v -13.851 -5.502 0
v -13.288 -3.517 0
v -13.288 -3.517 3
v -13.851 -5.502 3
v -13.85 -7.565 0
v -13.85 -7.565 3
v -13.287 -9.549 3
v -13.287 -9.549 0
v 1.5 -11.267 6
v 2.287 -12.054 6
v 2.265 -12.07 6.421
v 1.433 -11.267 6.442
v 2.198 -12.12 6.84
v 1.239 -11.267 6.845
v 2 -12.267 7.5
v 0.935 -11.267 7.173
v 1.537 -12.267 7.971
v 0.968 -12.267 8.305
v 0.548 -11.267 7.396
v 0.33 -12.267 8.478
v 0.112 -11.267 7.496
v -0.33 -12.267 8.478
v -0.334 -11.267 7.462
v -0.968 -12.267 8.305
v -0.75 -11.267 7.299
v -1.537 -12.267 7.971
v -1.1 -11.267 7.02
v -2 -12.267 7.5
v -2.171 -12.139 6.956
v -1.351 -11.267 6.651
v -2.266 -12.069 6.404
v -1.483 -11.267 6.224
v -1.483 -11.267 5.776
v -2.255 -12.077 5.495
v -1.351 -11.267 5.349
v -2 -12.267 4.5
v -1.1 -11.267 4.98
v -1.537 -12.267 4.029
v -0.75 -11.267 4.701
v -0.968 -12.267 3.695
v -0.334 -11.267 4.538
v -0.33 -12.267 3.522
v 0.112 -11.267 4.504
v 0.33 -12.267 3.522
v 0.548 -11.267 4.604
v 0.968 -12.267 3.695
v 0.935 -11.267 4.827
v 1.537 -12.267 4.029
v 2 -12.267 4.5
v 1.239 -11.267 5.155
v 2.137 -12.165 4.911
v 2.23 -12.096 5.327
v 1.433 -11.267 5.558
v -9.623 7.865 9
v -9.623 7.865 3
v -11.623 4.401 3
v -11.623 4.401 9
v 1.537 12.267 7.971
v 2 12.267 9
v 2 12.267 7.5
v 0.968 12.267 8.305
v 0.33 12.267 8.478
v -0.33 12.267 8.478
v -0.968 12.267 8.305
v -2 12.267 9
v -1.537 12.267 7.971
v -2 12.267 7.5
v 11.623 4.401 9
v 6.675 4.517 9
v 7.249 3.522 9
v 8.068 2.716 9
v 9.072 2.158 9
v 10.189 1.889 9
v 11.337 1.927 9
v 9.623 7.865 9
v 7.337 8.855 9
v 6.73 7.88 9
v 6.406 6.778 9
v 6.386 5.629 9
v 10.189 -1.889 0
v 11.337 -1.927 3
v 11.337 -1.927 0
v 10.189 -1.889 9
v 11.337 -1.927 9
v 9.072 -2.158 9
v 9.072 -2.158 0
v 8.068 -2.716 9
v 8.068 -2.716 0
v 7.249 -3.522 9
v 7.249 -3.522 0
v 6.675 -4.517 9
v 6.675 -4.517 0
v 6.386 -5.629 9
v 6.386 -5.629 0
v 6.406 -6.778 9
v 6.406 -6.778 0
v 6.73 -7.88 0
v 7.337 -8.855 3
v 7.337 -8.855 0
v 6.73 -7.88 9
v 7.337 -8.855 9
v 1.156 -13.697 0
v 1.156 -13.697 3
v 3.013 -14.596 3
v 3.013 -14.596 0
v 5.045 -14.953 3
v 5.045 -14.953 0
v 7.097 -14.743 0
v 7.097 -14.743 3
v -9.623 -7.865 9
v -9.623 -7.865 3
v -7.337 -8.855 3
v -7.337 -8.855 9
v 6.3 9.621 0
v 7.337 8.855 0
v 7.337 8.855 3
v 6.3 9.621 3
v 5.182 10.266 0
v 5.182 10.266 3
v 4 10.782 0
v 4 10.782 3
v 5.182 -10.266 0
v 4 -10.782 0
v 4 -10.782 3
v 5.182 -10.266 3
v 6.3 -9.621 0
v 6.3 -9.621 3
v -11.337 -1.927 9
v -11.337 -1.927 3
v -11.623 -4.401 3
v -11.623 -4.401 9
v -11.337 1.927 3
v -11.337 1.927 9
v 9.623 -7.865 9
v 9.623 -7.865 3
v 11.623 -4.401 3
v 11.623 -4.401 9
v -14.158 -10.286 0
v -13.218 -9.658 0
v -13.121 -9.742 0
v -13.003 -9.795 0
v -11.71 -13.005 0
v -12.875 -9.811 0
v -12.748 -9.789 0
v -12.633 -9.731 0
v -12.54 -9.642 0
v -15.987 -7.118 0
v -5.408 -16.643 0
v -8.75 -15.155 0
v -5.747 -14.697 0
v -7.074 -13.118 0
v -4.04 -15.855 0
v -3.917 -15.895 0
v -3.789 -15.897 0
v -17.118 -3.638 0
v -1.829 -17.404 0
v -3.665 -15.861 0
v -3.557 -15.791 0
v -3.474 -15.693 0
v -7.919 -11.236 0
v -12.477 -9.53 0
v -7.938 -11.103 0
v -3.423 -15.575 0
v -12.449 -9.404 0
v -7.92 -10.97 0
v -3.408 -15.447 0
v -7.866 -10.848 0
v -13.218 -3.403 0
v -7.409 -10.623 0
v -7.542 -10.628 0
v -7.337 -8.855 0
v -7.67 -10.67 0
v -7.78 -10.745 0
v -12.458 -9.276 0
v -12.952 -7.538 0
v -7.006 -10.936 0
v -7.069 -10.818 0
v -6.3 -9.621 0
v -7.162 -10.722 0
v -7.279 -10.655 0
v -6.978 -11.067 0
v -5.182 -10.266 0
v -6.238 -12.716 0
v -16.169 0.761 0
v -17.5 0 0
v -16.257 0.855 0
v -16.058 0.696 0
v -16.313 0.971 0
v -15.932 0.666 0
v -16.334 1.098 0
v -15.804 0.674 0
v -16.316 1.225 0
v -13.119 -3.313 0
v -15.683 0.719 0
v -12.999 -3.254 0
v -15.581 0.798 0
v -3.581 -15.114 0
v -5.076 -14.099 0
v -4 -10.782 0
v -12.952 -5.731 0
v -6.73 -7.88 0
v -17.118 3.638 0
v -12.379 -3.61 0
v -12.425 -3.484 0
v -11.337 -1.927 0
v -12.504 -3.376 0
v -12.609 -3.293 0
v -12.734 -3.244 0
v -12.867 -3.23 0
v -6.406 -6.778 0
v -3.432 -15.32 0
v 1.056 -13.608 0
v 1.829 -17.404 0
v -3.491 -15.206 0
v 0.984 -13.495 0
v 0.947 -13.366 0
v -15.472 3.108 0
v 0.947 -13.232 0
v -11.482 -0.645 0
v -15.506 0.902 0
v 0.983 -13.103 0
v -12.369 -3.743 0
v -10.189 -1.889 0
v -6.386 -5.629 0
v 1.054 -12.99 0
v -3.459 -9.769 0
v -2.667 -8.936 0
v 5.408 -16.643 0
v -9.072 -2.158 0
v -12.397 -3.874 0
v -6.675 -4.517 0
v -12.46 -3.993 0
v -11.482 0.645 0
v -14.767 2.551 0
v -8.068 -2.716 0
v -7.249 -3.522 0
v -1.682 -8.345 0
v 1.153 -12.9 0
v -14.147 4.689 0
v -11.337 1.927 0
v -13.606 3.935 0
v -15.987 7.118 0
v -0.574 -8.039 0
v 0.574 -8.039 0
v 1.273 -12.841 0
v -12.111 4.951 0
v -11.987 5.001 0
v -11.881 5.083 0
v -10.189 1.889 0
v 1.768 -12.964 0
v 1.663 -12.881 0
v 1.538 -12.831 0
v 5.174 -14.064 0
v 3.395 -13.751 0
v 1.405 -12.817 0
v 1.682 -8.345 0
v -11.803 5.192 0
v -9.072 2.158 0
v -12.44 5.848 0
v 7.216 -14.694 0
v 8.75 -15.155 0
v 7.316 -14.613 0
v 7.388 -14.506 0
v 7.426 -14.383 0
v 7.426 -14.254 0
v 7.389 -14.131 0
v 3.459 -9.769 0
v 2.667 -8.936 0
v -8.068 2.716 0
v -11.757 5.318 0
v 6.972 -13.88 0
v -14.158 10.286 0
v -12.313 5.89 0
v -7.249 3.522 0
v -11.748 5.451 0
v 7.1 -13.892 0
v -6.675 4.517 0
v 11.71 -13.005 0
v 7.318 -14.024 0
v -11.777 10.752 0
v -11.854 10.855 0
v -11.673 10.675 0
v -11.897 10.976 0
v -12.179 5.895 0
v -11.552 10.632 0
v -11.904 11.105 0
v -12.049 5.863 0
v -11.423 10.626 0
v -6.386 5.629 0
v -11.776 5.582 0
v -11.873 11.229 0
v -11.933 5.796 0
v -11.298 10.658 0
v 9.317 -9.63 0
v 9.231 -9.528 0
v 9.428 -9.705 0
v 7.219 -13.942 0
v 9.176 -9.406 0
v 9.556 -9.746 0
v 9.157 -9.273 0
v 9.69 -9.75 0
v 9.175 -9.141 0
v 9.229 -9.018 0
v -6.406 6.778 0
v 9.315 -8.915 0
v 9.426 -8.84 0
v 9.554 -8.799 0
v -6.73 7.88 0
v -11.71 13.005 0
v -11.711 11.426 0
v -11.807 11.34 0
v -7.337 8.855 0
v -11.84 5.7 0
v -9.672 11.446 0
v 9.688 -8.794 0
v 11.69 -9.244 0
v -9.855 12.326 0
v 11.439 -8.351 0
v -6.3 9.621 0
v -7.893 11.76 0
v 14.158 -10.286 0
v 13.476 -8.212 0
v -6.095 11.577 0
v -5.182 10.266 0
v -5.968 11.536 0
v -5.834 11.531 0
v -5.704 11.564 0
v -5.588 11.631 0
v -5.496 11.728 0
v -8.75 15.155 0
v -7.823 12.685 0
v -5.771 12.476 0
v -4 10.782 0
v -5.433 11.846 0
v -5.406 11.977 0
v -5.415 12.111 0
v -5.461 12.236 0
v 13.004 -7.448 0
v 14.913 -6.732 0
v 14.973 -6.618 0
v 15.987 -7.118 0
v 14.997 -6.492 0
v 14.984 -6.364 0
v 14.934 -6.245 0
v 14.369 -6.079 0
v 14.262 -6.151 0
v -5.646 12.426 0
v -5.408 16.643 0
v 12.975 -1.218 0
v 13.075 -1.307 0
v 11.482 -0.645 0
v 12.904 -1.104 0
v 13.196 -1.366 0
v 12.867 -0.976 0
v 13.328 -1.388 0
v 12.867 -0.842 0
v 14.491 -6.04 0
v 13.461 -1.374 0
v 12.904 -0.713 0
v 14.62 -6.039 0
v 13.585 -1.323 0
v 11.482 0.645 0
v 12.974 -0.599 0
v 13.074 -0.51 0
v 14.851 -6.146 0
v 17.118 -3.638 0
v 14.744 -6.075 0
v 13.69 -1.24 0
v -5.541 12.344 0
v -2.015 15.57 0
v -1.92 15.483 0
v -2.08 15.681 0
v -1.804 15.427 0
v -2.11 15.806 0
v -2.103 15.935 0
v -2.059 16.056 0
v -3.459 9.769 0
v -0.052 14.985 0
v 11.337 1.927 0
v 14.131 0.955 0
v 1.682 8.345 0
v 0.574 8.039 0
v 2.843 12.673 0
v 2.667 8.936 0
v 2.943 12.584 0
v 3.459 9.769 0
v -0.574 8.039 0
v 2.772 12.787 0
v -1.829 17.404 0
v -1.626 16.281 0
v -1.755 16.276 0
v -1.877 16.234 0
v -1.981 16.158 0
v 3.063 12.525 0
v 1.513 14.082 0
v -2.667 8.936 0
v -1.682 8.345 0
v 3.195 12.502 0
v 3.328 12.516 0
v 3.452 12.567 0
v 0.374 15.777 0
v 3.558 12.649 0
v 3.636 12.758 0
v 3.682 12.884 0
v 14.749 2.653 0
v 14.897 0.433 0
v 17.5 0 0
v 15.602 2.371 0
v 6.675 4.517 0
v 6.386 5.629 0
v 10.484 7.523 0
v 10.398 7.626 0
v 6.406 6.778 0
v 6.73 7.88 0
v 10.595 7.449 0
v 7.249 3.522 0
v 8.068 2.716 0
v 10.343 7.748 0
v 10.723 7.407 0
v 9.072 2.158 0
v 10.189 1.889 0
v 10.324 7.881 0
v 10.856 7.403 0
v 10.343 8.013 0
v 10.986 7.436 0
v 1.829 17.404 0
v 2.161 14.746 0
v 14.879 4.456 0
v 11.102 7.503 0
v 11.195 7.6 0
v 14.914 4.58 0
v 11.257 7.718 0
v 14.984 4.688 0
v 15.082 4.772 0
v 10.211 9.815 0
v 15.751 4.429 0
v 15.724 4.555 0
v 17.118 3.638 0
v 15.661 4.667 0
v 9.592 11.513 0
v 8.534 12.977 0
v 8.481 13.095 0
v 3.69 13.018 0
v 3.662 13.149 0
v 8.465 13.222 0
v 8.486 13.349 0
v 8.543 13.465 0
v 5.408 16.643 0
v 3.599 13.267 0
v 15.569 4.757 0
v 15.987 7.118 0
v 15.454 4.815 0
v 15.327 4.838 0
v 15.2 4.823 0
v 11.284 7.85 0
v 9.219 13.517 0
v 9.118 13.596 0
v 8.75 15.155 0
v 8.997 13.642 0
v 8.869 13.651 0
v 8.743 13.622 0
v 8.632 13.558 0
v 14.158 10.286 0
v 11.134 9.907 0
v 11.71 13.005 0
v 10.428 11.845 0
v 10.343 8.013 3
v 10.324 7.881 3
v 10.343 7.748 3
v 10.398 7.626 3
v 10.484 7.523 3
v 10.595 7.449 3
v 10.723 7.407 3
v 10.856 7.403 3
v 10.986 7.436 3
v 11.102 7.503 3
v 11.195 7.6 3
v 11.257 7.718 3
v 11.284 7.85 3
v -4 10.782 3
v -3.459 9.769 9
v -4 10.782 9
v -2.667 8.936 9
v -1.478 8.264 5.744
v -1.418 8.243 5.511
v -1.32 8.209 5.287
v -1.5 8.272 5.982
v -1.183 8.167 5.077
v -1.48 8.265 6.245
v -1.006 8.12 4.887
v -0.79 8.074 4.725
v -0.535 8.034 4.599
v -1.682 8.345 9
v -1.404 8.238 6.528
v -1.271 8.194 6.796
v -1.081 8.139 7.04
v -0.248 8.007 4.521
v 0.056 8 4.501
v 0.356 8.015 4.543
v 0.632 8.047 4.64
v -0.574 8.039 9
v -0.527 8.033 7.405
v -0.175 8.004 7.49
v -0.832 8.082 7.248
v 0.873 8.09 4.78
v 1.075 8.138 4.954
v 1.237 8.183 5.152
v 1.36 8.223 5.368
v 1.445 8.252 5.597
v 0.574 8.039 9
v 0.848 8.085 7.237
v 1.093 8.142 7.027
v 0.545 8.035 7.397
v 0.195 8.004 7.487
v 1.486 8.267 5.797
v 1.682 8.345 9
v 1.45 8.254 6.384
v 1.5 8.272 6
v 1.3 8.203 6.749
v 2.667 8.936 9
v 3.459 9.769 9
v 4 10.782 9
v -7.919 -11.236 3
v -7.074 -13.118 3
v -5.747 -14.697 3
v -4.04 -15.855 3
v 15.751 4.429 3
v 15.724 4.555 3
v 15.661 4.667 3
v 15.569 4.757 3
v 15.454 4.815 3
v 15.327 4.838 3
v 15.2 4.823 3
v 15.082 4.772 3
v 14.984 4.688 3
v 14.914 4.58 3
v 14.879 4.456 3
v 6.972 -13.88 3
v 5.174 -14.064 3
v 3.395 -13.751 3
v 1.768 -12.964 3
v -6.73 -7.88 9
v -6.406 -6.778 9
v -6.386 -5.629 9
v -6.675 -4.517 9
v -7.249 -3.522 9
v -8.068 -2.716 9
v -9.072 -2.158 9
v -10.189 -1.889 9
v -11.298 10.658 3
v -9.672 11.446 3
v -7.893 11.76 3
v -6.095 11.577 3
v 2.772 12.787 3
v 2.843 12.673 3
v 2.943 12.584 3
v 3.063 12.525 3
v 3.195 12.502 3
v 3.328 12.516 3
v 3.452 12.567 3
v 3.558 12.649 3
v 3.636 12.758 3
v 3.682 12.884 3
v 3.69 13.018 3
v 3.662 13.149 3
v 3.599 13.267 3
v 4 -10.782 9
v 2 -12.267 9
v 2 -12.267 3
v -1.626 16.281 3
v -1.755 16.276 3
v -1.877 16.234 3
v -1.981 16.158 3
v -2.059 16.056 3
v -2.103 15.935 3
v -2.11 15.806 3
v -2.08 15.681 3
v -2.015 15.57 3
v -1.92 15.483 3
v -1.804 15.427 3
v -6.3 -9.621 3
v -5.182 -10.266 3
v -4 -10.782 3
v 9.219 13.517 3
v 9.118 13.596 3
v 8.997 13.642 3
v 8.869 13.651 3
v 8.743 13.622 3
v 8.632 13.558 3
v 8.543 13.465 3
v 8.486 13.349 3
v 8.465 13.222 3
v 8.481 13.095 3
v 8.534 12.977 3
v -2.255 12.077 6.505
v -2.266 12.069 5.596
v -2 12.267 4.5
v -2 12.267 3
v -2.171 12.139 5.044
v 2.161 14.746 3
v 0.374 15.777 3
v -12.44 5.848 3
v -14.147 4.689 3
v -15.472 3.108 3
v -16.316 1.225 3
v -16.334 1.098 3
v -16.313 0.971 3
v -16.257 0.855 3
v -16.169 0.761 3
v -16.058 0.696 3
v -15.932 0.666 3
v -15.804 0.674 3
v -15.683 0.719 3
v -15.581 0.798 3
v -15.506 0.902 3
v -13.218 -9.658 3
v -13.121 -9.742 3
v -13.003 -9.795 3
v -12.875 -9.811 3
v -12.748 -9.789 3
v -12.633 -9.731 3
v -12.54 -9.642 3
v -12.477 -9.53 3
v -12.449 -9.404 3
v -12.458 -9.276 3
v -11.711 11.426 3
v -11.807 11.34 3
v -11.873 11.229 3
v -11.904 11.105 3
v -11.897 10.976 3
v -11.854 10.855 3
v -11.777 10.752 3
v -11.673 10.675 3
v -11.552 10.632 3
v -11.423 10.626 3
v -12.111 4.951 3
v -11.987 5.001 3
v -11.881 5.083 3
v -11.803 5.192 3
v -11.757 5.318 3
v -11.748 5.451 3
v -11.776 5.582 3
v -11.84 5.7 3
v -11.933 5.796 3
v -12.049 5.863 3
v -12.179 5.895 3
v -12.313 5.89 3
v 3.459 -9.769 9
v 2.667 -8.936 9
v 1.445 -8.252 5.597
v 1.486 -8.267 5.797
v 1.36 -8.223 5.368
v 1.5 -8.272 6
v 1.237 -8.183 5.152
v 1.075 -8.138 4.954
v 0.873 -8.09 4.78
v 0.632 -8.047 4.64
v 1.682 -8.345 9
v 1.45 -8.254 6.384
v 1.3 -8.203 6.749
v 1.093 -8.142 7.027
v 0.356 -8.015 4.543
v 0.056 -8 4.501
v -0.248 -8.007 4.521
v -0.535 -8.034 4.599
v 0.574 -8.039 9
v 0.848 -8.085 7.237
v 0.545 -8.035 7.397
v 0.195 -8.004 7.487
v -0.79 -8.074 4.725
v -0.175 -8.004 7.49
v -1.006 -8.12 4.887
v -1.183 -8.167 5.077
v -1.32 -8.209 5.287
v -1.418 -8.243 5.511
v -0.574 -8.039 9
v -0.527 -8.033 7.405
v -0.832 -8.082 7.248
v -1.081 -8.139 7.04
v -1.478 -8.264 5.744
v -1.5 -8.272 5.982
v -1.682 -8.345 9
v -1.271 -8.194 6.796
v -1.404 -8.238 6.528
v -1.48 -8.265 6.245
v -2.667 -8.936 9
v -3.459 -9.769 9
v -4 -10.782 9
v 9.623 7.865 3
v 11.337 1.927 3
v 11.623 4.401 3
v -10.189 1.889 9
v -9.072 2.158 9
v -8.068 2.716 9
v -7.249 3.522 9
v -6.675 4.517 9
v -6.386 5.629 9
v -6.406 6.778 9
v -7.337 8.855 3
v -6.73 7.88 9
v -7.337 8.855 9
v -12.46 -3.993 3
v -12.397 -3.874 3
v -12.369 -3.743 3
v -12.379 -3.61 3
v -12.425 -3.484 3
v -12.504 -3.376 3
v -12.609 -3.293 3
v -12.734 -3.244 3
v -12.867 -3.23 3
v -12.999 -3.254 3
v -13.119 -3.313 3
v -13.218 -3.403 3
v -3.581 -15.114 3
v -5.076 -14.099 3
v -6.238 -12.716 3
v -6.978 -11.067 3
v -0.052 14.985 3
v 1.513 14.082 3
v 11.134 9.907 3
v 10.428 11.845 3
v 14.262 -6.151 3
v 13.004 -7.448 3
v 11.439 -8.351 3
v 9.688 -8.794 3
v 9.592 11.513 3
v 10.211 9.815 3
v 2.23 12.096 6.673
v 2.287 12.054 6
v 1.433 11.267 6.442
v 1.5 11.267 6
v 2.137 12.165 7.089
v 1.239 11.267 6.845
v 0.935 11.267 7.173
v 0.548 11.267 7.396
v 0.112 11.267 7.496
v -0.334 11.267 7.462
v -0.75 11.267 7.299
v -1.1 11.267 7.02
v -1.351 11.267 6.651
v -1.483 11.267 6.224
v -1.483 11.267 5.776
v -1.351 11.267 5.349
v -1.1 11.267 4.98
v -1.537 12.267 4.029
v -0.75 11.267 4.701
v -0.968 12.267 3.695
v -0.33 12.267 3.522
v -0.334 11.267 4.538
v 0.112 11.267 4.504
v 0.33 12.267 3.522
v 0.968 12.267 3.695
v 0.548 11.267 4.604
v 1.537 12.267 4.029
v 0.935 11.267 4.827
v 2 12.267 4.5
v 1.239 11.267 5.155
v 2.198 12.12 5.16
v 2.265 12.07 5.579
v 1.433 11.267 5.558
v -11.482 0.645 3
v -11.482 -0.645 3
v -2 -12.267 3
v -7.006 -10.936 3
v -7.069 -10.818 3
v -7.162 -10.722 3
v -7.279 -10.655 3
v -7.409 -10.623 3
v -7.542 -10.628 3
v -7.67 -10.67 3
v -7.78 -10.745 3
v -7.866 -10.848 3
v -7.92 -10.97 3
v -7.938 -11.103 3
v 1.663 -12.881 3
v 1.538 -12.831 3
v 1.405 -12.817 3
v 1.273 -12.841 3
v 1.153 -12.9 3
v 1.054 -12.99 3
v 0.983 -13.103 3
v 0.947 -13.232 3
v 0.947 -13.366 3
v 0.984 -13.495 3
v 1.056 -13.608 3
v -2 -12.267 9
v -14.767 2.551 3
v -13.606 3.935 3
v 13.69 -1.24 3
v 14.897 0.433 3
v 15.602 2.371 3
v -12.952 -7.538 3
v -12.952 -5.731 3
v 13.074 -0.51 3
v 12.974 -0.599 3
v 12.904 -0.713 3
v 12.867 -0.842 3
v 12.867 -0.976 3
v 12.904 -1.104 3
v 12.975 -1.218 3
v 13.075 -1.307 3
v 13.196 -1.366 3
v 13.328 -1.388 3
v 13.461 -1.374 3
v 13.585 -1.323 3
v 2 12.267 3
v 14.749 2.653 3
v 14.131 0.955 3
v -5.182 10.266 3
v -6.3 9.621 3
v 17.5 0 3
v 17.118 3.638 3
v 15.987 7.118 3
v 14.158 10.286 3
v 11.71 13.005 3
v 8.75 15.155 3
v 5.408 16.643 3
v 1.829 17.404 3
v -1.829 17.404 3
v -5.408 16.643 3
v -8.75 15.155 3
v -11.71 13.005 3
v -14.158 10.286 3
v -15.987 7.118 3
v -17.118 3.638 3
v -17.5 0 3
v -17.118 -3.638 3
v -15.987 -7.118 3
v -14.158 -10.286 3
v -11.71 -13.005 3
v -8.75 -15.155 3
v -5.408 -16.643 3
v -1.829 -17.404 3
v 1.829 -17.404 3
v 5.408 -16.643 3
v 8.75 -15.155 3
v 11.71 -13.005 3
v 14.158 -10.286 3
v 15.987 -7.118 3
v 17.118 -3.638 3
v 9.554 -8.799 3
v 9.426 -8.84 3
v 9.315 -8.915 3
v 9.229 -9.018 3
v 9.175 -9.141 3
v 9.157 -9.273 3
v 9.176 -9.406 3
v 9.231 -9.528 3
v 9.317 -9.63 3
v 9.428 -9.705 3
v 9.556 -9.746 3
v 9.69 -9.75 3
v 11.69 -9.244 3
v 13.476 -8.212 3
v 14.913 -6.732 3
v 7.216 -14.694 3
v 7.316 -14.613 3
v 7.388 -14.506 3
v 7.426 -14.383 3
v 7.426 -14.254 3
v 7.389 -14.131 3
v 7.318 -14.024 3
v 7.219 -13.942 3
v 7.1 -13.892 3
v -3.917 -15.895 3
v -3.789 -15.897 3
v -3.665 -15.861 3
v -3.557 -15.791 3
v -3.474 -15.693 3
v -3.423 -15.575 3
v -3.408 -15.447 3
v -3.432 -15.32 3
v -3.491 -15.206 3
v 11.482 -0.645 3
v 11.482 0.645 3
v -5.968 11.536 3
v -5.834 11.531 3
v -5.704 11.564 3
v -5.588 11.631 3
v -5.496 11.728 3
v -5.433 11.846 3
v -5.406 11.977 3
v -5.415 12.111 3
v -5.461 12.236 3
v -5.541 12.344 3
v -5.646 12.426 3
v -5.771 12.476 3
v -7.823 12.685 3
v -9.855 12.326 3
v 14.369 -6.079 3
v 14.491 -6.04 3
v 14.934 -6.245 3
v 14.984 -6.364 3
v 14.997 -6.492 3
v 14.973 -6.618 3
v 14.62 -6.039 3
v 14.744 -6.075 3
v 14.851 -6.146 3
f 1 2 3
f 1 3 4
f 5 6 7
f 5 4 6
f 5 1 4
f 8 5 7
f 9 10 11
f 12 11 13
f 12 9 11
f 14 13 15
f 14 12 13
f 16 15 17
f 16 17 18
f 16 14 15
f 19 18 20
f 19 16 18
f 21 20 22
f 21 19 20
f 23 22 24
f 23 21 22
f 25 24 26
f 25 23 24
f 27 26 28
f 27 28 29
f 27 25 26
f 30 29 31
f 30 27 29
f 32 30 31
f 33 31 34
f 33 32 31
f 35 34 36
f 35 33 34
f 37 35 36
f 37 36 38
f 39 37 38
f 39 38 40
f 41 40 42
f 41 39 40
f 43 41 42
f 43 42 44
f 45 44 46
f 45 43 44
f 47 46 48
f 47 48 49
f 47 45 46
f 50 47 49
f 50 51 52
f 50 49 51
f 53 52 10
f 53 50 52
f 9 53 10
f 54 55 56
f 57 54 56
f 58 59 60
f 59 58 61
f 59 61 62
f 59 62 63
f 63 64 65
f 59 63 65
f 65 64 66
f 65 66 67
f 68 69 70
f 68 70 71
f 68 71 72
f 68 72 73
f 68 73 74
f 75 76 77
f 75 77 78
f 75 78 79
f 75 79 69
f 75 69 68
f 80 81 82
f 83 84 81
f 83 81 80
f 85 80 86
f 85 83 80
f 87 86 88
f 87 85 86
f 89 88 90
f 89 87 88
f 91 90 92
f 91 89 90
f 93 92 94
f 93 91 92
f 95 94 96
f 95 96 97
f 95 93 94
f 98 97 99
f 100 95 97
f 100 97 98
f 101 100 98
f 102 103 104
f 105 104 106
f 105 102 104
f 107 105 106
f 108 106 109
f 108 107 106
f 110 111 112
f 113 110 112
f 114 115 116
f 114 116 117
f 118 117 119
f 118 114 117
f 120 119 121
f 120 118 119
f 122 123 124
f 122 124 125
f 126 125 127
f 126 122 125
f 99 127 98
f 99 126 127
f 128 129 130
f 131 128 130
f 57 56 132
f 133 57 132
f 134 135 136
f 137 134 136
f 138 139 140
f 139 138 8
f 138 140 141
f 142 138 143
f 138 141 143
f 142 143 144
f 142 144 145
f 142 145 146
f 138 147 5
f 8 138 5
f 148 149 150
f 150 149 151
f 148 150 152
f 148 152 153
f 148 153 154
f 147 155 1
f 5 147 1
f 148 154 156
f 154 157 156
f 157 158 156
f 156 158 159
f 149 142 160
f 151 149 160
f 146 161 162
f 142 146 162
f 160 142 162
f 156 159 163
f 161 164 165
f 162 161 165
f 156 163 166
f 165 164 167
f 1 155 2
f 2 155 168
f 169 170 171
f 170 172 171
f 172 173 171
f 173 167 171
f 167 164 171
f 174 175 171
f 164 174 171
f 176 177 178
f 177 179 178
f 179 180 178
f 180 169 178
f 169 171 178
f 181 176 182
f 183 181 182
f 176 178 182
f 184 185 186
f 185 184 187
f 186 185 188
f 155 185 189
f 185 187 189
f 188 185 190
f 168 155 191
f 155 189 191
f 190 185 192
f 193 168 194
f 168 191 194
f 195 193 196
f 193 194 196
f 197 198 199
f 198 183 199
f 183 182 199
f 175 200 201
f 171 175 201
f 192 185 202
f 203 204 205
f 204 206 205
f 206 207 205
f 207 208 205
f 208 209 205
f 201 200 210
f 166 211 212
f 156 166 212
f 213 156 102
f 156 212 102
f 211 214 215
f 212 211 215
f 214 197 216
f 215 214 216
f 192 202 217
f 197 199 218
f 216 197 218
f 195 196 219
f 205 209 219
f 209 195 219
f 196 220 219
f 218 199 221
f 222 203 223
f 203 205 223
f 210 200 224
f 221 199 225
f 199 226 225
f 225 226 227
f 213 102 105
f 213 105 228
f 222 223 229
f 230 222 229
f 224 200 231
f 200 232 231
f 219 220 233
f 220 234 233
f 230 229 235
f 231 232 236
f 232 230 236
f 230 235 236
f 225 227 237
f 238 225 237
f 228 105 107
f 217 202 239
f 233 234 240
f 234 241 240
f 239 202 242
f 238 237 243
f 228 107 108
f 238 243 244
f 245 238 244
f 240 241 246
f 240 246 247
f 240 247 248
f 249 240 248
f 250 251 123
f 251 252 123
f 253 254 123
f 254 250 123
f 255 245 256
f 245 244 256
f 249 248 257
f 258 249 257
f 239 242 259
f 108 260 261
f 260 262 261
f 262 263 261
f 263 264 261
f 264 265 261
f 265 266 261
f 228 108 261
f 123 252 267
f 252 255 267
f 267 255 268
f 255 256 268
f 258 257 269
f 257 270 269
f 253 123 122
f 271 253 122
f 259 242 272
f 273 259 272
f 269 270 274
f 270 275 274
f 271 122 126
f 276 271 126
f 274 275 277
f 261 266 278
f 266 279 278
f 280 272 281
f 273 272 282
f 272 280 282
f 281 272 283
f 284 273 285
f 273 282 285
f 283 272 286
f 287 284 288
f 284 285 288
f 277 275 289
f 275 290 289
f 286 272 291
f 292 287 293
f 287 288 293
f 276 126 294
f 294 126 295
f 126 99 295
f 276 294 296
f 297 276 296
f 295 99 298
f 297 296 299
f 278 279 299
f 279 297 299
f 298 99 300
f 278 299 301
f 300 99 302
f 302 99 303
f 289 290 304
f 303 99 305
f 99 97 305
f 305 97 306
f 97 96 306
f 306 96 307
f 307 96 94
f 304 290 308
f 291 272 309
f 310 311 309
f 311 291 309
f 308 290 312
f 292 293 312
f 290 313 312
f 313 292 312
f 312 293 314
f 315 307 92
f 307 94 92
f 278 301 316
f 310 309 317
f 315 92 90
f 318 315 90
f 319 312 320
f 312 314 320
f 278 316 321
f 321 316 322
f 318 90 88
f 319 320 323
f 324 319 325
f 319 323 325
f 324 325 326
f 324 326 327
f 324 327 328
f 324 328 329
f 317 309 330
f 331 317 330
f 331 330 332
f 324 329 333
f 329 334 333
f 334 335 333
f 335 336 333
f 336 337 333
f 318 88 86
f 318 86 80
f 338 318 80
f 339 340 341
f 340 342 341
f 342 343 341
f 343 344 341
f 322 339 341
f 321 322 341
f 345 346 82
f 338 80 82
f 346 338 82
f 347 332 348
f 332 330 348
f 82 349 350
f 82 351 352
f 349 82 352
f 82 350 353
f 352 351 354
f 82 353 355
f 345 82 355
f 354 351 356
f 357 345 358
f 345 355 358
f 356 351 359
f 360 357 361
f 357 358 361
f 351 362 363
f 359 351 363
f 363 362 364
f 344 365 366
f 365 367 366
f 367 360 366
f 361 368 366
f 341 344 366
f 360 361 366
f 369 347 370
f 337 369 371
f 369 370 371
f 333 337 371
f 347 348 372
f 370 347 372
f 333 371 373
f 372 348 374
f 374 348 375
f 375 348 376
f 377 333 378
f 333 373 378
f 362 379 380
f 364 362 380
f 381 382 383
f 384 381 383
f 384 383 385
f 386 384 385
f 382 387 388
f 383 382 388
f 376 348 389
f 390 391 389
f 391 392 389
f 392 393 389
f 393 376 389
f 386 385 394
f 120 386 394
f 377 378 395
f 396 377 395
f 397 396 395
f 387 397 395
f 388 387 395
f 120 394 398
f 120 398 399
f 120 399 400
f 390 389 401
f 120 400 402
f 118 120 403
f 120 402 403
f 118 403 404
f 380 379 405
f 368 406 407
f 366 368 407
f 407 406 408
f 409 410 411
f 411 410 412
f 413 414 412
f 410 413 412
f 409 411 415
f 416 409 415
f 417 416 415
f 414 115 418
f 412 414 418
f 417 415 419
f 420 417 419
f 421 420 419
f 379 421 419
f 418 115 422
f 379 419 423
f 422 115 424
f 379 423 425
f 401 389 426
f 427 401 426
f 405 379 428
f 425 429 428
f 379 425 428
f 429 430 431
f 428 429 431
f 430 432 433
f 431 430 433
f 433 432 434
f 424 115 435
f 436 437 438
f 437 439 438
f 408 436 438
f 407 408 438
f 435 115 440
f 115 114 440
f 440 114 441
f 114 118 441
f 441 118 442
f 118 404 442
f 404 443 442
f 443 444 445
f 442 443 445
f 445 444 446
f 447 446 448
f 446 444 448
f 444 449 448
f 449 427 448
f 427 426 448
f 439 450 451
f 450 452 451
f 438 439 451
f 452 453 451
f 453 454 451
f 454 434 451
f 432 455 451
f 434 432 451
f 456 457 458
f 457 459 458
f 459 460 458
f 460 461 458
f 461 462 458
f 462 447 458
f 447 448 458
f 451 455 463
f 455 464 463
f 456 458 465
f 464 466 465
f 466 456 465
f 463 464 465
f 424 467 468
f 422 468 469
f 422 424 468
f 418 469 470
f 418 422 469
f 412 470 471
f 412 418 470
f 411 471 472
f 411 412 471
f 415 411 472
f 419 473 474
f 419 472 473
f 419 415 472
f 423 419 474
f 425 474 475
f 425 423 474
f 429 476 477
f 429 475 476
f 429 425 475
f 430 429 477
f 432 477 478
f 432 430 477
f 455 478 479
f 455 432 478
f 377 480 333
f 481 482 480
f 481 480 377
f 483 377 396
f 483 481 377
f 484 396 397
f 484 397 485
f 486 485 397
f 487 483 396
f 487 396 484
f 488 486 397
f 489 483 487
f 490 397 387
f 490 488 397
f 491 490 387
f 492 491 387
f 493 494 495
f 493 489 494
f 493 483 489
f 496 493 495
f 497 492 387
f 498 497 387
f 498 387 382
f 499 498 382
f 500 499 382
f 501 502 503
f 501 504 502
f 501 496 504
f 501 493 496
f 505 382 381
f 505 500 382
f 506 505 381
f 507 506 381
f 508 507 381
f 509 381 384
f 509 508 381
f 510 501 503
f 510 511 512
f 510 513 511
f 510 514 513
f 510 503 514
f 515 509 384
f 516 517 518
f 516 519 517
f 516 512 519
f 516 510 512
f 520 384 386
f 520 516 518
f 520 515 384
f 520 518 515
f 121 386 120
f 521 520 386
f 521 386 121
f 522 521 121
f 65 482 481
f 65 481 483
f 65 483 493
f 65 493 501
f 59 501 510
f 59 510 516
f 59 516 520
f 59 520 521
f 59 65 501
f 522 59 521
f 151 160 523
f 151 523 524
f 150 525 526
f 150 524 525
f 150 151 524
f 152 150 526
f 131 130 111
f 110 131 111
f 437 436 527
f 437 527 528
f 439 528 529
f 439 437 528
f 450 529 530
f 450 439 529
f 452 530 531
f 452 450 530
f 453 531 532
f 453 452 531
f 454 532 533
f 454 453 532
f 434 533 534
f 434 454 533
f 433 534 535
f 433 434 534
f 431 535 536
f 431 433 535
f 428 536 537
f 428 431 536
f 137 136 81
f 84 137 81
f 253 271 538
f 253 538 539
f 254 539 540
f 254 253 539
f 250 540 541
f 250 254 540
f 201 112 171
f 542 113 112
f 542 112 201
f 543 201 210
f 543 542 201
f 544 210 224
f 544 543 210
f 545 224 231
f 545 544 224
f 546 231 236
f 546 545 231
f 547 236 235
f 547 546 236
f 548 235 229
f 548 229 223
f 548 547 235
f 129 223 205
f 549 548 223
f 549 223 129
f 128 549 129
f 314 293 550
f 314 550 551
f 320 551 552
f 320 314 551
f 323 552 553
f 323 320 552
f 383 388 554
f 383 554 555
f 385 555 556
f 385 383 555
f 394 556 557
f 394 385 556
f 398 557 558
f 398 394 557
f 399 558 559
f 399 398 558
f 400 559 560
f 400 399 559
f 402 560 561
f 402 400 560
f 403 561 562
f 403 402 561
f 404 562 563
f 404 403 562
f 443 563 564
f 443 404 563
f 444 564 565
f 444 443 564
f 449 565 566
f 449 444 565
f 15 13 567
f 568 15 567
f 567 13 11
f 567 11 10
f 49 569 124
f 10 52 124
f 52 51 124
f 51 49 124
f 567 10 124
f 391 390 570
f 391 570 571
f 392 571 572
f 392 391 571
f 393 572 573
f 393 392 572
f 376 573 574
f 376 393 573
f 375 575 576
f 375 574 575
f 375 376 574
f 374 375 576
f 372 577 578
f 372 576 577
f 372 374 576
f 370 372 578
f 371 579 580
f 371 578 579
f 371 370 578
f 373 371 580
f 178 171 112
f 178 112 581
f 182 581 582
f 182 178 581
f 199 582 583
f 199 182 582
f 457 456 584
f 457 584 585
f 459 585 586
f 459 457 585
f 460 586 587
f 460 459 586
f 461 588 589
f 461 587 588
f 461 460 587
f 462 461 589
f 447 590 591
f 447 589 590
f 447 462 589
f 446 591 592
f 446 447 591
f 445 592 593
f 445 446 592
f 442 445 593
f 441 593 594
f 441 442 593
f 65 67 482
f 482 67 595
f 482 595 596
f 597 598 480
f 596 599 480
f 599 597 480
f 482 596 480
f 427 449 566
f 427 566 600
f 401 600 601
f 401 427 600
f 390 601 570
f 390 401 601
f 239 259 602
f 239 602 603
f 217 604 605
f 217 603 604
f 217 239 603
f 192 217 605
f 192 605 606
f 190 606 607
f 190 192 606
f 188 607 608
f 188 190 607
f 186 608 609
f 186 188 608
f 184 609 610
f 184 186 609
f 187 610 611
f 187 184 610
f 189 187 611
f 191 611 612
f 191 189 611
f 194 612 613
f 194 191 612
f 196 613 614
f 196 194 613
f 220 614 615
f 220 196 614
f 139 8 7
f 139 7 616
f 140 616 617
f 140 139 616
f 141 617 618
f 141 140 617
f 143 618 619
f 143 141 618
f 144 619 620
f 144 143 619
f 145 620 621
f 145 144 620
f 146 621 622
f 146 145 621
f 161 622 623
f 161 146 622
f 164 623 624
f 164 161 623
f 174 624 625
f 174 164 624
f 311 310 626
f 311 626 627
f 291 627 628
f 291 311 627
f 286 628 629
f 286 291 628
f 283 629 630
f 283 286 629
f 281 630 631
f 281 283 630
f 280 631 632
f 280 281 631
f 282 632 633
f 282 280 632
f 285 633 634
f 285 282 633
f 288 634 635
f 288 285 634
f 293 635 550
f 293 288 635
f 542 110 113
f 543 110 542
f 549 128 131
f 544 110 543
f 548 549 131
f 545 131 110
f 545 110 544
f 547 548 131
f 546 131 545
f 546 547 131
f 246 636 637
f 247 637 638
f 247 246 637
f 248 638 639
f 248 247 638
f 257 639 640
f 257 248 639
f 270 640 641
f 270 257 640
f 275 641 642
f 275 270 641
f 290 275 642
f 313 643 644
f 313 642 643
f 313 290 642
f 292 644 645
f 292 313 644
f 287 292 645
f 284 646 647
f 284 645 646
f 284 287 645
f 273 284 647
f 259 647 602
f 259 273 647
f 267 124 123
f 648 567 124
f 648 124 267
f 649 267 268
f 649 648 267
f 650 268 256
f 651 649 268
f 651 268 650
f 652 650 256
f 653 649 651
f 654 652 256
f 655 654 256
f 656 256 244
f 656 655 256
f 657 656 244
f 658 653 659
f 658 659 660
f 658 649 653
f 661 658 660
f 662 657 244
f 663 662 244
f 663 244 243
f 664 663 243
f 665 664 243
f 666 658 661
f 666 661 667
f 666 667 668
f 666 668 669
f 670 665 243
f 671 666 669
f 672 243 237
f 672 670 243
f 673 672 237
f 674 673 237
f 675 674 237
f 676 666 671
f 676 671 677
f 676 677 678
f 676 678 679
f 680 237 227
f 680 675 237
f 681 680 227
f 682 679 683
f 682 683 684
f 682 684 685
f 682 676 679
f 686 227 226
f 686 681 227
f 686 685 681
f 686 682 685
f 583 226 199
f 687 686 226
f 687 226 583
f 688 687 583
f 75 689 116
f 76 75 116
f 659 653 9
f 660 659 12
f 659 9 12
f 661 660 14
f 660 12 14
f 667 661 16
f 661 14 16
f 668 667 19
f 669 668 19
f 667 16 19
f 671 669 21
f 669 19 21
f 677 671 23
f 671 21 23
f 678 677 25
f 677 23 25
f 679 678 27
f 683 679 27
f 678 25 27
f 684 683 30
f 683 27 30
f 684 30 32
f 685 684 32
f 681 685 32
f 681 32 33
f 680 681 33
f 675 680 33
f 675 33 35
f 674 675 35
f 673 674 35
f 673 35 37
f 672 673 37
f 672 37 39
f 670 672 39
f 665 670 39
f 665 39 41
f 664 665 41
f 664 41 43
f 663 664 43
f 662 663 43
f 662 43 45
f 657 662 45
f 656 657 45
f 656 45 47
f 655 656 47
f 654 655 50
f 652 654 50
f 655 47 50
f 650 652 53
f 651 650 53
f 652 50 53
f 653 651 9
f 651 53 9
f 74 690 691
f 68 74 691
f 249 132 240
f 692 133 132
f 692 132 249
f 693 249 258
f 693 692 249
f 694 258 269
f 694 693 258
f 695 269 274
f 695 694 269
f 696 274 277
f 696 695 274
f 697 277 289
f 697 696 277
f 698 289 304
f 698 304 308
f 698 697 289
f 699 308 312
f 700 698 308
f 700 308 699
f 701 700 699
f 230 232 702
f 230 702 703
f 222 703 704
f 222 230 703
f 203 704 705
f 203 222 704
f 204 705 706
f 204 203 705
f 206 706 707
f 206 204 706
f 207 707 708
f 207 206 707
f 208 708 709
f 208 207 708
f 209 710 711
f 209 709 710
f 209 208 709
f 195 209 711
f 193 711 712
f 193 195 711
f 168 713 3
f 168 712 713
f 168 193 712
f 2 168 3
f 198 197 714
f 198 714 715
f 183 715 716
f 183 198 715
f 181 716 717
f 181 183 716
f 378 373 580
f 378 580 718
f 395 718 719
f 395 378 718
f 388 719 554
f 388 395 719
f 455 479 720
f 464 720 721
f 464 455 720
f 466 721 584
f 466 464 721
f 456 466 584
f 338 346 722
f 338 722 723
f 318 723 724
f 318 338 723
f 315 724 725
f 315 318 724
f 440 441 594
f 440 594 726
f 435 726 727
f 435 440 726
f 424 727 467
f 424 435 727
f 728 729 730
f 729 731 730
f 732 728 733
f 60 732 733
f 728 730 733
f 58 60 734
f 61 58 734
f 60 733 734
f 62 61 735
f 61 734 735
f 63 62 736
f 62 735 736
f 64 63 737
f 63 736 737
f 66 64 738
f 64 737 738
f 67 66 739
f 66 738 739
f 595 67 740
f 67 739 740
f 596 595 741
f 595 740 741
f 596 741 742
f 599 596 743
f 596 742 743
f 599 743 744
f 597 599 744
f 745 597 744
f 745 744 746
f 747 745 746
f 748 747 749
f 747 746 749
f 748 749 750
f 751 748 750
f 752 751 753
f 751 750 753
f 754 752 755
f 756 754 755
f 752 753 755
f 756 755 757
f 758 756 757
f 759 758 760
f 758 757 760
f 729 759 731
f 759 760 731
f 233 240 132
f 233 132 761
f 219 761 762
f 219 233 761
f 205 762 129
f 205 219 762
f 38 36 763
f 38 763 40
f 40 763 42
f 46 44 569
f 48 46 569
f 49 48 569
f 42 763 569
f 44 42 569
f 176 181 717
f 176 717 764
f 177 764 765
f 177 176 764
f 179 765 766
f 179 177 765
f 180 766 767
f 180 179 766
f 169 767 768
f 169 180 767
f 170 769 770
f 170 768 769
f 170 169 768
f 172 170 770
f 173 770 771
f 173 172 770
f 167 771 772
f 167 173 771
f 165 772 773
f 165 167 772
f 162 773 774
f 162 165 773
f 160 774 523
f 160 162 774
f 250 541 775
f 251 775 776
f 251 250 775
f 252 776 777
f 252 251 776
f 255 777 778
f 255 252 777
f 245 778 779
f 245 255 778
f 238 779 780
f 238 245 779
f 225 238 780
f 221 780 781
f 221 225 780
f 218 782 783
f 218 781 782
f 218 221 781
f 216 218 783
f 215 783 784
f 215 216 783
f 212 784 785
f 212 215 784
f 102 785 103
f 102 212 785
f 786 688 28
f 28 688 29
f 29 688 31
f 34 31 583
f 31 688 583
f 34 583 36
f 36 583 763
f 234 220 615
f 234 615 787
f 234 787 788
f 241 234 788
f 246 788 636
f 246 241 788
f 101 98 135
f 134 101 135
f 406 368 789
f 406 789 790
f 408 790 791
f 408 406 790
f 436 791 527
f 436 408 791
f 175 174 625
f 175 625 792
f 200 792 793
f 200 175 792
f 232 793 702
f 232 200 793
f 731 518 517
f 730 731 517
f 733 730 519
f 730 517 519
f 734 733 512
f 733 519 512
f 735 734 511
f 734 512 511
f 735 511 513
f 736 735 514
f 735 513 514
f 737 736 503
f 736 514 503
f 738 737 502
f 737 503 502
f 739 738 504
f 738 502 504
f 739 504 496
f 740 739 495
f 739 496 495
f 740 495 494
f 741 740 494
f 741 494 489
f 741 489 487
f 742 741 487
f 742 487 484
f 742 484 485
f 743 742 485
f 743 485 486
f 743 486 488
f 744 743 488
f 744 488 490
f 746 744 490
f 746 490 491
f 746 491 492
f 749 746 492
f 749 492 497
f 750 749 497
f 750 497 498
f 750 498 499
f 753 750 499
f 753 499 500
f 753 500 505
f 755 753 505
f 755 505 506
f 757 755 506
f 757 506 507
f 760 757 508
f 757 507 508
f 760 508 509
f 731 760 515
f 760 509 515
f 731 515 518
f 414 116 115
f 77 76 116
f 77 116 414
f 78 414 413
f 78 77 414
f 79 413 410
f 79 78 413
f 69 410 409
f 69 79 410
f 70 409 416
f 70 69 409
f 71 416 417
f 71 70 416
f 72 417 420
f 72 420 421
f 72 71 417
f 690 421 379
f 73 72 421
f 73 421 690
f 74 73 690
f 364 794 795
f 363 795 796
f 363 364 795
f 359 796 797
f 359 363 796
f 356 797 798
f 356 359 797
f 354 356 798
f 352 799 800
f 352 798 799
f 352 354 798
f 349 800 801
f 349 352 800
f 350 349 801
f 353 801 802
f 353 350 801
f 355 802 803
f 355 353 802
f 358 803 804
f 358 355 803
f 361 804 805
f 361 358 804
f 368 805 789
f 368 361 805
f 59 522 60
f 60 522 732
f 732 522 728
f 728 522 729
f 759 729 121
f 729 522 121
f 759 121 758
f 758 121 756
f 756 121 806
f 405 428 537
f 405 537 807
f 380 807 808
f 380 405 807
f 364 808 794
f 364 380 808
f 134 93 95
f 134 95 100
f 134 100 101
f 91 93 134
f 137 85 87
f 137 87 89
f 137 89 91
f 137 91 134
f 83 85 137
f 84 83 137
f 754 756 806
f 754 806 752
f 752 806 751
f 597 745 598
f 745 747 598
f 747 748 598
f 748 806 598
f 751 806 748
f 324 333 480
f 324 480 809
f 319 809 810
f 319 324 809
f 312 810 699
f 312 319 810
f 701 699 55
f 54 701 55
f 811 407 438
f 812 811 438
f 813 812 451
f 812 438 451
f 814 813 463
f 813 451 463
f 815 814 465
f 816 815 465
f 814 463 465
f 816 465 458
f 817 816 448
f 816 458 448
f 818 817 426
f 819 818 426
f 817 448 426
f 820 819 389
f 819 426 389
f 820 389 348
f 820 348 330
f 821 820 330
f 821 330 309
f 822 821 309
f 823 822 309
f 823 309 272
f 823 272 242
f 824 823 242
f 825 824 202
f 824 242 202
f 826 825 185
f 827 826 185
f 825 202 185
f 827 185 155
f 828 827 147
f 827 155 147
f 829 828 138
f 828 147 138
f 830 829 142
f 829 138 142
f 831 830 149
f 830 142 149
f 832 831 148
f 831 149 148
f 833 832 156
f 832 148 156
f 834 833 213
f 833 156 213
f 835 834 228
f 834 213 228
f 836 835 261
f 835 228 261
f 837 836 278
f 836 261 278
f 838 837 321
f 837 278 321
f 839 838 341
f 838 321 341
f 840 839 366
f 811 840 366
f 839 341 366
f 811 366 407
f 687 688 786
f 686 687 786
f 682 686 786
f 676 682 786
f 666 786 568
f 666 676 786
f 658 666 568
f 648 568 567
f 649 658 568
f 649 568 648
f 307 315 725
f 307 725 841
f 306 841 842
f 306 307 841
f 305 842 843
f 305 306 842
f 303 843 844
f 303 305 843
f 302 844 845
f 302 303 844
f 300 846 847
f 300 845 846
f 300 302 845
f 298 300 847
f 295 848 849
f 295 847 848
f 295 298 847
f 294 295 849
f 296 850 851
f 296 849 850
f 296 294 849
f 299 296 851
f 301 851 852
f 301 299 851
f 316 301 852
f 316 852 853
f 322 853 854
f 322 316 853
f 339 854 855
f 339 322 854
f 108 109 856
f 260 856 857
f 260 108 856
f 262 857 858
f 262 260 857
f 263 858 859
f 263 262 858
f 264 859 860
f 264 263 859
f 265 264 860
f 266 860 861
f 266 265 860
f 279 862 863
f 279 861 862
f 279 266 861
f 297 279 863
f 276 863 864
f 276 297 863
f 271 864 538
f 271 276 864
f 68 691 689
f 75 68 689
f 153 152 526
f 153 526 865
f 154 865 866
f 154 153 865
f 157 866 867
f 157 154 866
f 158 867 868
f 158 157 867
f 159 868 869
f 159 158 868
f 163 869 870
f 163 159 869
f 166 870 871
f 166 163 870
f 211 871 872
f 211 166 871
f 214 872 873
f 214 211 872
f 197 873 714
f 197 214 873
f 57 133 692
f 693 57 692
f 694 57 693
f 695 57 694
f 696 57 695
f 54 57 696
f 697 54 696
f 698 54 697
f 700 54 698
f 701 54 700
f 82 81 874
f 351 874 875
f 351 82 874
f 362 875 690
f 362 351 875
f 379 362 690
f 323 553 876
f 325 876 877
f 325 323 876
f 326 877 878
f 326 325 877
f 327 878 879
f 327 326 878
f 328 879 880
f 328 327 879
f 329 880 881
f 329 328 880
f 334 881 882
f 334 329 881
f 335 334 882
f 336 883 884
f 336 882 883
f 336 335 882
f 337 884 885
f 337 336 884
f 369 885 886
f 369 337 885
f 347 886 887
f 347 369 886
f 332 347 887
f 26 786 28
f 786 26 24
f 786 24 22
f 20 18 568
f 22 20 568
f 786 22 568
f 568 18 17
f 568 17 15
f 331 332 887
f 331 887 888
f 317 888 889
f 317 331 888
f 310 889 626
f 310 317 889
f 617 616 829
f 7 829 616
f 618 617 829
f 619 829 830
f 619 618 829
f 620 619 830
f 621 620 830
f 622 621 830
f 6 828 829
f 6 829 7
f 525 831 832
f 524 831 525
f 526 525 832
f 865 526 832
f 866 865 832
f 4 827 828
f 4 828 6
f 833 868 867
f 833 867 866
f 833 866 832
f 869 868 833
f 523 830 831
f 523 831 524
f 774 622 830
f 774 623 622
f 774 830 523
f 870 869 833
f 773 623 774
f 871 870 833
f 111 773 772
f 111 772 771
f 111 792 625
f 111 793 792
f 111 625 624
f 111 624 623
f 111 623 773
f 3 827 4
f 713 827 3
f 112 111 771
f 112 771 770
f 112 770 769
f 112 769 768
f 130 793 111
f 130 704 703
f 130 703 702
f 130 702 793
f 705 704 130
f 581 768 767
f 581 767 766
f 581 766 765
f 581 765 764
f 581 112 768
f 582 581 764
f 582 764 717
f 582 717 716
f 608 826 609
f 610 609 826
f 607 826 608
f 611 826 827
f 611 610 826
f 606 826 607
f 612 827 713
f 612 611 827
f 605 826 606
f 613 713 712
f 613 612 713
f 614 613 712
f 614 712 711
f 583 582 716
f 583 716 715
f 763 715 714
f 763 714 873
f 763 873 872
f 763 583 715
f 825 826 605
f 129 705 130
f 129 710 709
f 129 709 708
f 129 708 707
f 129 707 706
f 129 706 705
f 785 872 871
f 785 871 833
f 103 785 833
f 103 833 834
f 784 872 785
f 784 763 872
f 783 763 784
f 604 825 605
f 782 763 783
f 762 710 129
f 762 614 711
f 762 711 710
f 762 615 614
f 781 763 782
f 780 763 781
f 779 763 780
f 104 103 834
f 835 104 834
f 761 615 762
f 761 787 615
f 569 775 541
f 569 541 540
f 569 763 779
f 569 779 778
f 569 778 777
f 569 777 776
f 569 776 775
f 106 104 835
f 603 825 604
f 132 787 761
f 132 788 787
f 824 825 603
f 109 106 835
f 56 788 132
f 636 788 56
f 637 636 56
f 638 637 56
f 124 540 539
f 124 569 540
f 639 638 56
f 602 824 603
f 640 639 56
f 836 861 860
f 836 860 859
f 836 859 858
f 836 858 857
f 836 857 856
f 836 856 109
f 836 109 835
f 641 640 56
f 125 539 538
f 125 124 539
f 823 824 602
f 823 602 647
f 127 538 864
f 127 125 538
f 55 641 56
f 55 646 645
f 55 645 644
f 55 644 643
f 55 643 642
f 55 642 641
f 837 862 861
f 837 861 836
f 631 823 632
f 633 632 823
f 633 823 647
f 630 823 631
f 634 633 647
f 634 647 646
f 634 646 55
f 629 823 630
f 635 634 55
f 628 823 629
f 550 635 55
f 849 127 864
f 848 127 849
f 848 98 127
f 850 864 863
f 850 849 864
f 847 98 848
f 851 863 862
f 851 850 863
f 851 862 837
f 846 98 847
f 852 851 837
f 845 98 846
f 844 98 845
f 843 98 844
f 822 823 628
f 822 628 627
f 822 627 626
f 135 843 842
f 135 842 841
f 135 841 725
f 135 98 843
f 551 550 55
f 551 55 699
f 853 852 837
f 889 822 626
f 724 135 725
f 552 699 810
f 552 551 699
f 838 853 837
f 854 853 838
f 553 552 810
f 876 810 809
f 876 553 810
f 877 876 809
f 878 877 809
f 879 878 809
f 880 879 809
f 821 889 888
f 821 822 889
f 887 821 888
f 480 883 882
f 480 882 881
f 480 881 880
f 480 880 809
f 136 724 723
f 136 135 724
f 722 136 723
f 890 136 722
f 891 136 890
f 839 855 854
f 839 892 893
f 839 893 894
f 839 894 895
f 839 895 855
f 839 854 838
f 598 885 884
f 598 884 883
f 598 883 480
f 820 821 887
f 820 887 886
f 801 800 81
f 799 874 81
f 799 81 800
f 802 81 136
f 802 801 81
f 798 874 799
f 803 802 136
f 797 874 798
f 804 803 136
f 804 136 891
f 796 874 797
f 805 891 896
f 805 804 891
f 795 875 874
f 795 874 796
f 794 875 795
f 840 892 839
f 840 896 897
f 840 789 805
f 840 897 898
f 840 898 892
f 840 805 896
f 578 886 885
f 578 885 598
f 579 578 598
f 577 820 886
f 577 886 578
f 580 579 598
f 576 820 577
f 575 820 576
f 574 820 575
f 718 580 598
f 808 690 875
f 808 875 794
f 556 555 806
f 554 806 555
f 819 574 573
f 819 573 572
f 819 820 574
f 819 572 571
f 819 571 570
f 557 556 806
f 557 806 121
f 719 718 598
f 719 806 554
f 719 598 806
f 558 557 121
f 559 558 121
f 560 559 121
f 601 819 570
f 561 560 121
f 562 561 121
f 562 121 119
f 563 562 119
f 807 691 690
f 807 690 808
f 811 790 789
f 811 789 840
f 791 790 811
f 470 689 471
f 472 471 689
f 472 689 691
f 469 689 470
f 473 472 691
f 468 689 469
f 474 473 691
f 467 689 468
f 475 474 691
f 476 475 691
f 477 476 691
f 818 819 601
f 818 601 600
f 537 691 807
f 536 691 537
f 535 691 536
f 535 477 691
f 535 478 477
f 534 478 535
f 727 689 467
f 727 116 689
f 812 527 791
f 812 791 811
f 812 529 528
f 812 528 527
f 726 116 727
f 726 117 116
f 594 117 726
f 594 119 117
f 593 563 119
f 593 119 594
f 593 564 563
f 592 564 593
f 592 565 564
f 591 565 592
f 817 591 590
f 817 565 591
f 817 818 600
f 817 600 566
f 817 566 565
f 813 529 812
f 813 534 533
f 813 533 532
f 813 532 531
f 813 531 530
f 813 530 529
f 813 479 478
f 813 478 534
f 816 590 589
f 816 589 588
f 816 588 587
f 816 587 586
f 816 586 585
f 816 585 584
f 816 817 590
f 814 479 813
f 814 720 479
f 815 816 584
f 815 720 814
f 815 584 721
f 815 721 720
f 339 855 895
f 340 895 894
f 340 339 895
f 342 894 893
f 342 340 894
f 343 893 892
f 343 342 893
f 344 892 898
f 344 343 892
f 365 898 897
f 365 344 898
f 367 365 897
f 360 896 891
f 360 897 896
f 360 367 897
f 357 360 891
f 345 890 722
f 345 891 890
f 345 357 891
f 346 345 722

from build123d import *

# Parameters (mm, degrees)
F0_R          = 17.5
F0_R_2        = 11.5
F1_DEPTH      = 3
F3_DEPTH      = 3.001
F5_DEPTH      = 6
F5_DEPTH_BACK = 3
F6_R          = 1.5
F7_DEPTH      = 29.767666761


# Not quite as in the source:
# - a fillet or chamfer that OpenCascade refuses, or shapes differently, is made with other operations: its cross-section is extruded or revolved along the edge and cut away or added


with BuildPart() as f1:
    # F0 (on Top) → F1 (new body)
    with BuildSketch(Plane.XY):
        Circle(F0_R)
        Circle(F0_R_2, mode=Mode.SUBTRACT)
    extrude(amount=F1_DEPTH)

    # F2 (on Top) → F3 (cut, through all)
    with BuildSketch(Plane.XY):
        with BuildLine():
            ThreePointArc((10.3428791664, 8.0132342217), (10.722508829, 7.4074823165), (11.2842680034, 7.8496142891))
            ThreePointArc((11.2842680034, 7.8496142891), (10.8476709377, 10.9006538274), (9.2192751651, 13.5174813857))
            ThreePointArc((9.2192751651, 13.5174813857), (8.6315737781, 13.5584848298), (8.5342502168, 12.9774492654))
            ThreePointArc((8.5342502168, 12.9774492654), (9.9604845752, 10.6854945477), (10.3428791664, 8.0132342217))
        make_face()
        with BuildLine():
            ThreePointArc((2.7722974401, 12.7867681236), (3.4524804527, 12.5667564861), (3.5986159928, 13.2665410638))
            ThreePointArc((3.5986159928, 13.2665410638), (1.3029928249, 15.3231337636), (-1.6264950391, 16.2810273468))
            ThreePointArc((-1.6264950391, 16.2810273468), (-2.1030569267, 15.9346706376), (-1.8041286384, 15.427013193))
            ThreePointArc((-1.8041286384, 15.427013193), (0.761670361, 14.5880397916), (2.7722974401, 12.7867681236))
        make_face()
        with BuildLine():
            ThreePointArc((-6.0954730691, 11.5772311114), (-5.4330018975, 11.8459056319), (-5.770868435, 12.4759058335))
            ThreePointArc((-5.770868435, 12.4759058335), (-8.8513701119, 12.5757491141), (-11.711210138, 11.426499669))
            ThreePointArc((-11.711210138, 11.426499669), (-11.8536439226, 10.85484696), (-11.298335653, 10.6581061954))
            ThreePointArc((-11.298335653, 10.6581061954), (-8.7935378801, 11.6646790891), (-6.0954730691, 11.5772311114))
        make_face()
        with BuildLine():
            ThreePointArc((-12.1111039857, 4.9505789955), (-11.7763222787, 5.5822238799), (-12.440099386, 5.8476556095))
            ThreePointArc((-12.440099386, 5.8476556095), (-14.8640786012, 3.9440316902), (-16.3161198577, 1.2253858046))
            ThreePointArc((-16.3161198577, 1.2253858046), (-16.0577791885, 0.6959197515), (-15.5059258486, 0.9021528573))
            ThreePointArc((-15.5059258486, 0.9021528573), (-14.2341520178, 3.2832854023), (-12.1111039857, 4.9505789955))
        make_face()
        with BuildLine():
            ThreePointArc((-12.4598147474, -3.9925040519), (-12.6093705865, -3.293442465), (-13.288469578, -3.5167776637))
            ThreePointArc((-13.288469578, -3.5167776637), (-13.9217195173, -6.5331419945), (-13.2865357625, -9.5490996964))
            ThreePointArc((-13.2865357625, -9.5490996964), (-12.7483011098, -9.7886360429), (-12.4581210104, -9.275927829))
            ThreePointArc((-12.4581210104, -9.275927829), (-13.0144482314, -6.6343940139), (-12.4598147474, -3.9925040519))
        make_face()
        with BuildLine():
            ThreePointArc((-6.9784397134, -11.0674500817), (-7.5423542593, -10.6280704779), (-7.9190171696, -11.2356715834))
            ThreePointArc((-7.9190171696, -11.2356715834), (-6.4652331485, -13.9533859322), (-4.0400339207, -15.855455323))
            ThreePointArc((-4.0400339207, -15.855455323), (-3.4737512602, -15.6929802443), (-3.5810228949, -15.1136987937))
            ThreePointArc((-3.5810228949, -15.1136987937), (-5.705139478, -13.4477667379), (-6.9784397134, -11.0674500817))
        make_face()
        with BuildLine():
            ThreePointArc((1.7682248193, -12.9638132172), (1.0538134497, -12.9897061964), (1.1558313826, -13.6972698986))
            ThreePointArc((1.1558313826, -13.6972698986), (4.0164076635, -14.8446855176), (7.0968446926, -14.7428671903))
            ThreePointArc((7.0968446926, -14.7428671903), (7.4262054104, -14.2544045814), (6.9716756317, -13.8796021227))
            ThreePointArc((6.9716756317, -13.8796021227), (4.2736674427, -13.9687799499), (1.7682248193, -12.9638132172))
        make_face()
        with BuildLine():
            ThreePointArc((9.6875173073, -8.7942640717), (9.1568901338, -9.2733140211), (9.6898535852, -9.7497634001))
            ThreePointArc((9.6898535852, -9.7497634001), (12.6187266924, -8.7899917691), (14.9130308016, -6.7319276504))
            ThreePointArc((14.9130308016, -6.7319276504), (14.8513580365, -6.1460345947), (14.2622496488, -6.151085364))
            ThreePointArc((14.2622496488, -6.151085364), (12.2527778705, -7.9536457777), (9.6875173073, -8.7942640717))
        make_face()
        with BuildLine():
            ThreePointArc((13.0739127825, -0.5097810297), (12.9753561567, -1.2178351539), (13.6898856045, -1.2402342502))
            ThreePointArc((13.6898856045, -1.2402342502), (15.3166032603, 1.3776368181), (15.7512440587, 4.4289556541))
            ThreePointArc((15.7512440587, 4.4289556541), (15.3273951828, 4.8381332844), (14.8793585479, 4.4555925983))
            ThreePointArc((14.8793585479, 4.4555925983), (14.4986773582, 1.7830876488), (13.0739127825, -0.5097810297))
        make_face()
    extrude(amount=F3_DEPTH, mode=Mode.SUBTRACT)

    # F4 (on face) → F5 (join, two sides)
    with BuildSketch(Plane.XY.offset(3)) as f5_sk:
        with BuildLine():
            ThreePointArc((-4, 10.7819293264), (0, 8), (4, 10.7819293264))
            ThreePointArc((4, 10.7819293264), (0, 11.5), (-4, 10.7819293264))
        make_face()
        with BuildLine():
            ThreePointArc((7.3374246985, 8.8550662783), (6.9282032303, 4), (11.3374246985, 1.9268630481))
            ThreePointArc((11.3374246985, 1.9268630481), (9.9592921435, 5.75), (7.3374246985, 8.8550662783))
        make_face()
        with BuildLine():
            ThreePointArc((7.3374246985, -8.8550662783), (9.9592921435, -5.75), (11.3374246985, -1.9268630481))
            ThreePointArc((11.3374246985, -1.9268630481), (6.9282032303, -4), (7.3374246985, -8.8550662783))
        make_face()
        with BuildLine():
            ThreePointArc((-4, -10.7819293264), (0, -11.5), (4, -10.7819293264))
            ThreePointArc((4, -10.7819293264), (0, -8), (-4, -10.7819293264))
        make_face()
        with BuildLine():
            ThreePointArc((-11.3374246985, -1.9268630481), (-9.9592921435, -5.75), (-7.3374246985, -8.8550662783))
            ThreePointArc((-7.3374246985, -8.8550662783), (-6.9282032303, -4), (-11.3374246985, -1.9268630481))
        make_face()
        with BuildLine():
            ThreePointArc((-11.3374246985, 1.9268630481), (-6.9282032303, 4), (-7.3374246985, 8.8550662783))
            ThreePointArc((-7.3374246985, 8.8550662783), (-9.9592921435, 5.75), (-11.3374246985, 1.9268630481))
        make_face()
        with BuildLine():
            ThreePointArc((-4, 10.7819293264), (0, 11.5), (4, 10.7819293264))
            Line((4, 10.7819293264), (2, 12.266666761))
            Line((2, 12.266666761), (0, 12.266666761))
            Line((0, 12.266666761), (-2, 12.266666761))
            Line((-2, 12.266666761), (-4, 10.7819293264))
        make_face()
        with BuildLine():
            ThreePointArc((7.3374246985, 8.8550662783), (9.9592921435, 5.75), (11.3374246985, 1.9268630481))
            Line((11.3374246985, 1.9268630481), (11.6232450348, 4.4012825729))
            Line((11.6232450348, 4.4012825729), (10.6232450348, 6.1333333805))
            Line((10.6232450348, 6.1333333805), (9.6232450348, 7.8653841881))
            Line((9.6232450348, 7.8653841881), (7.3374246985, 8.8550662783))
        make_face()
        with BuildLine():
            Line((11.6232450348, -4.4012825729), (11.3374246985, -1.9268630481))
            ThreePointArc((11.3374246985, -1.9268630481), (9.9592921435, -5.75), (7.3374246985, -8.8550662783))
            Line((7.3374246985, -8.8550662783), (9.6232450348, -7.8653841881))
            Line((9.6232450348, -7.8653841881), (10.6232450348, -6.1333333805))
            Line((10.6232450348, -6.1333333805), (11.6232450348, -4.4012825729))
        make_face()
        with BuildLine():
            Line((2, -12.266666761), (4, -10.7819293264))
            ThreePointArc((4, -10.7819293264), (0, -11.5), (-4, -10.7819293264))
            Line((-4, -10.7819293264), (-2, -12.266666761))
            Line((-2, -12.266666761), (0, -12.266666761))
            Line((0, -12.266666761), (2, -12.266666761))
        make_face()
        with BuildLine():
            Line((-9.6232450348, -7.8653841881), (-7.3374246985, -8.8550662783))
            ThreePointArc((-7.3374246985, -8.8550662783), (-9.9592921435, -5.75), (-11.3374246985, -1.9268630481))
            Line((-11.3374246985, -1.9268630481), (-11.6232450348, -4.4012825729))
            Line((-11.6232450348, -4.4012825729), (-10.6232450348, -6.1333333805))
            Line((-10.6232450348, -6.1333333805), (-9.6232450348, -7.8653841881))
        make_face()
        with BuildLine():
            ThreePointArc((-11.3374246985, 1.9268630481), (-9.9592921435, 5.75), (-7.3374246985, 8.8550662783))
            Line((-7.3374246985, 8.8550662783), (-9.6232450348, 7.8653841881))
            Line((-9.6232450348, 7.8653841881), (-10.6232450348, 6.1333333805))
            Line((-10.6232450348, 6.1333333805), (-11.6232450348, 4.4012825729))
            Line((-11.6232450348, 4.4012825729), (-11.3374246985, 1.9268630481))
        make_face()
    extrude(amount=F5_DEPTH)
    extrude(f5_sk.sketch, amount=-F5_DEPTH_BACK)

    # F6 (on face) → F7 (cut, through all)
    with BuildSketch(Plane.XZ.offset(12.266666761)):
        with Locations((0, 6)):
            Circle(F6_R)
    extrude(amount=-F7_DEPTH, mode=Mode.SUBTRACT)

    # F8: chamfer of 1 on 2 edges, made by hand

    # F8_s1 → F8_t2 (revolve, cut)
    with BuildSketch(Plane.XY.offset(6)):
        Polygon((2.5, -12.266666761), (1.5, -11.266666761), (1.5, -12.266666761), align=None)
    revolve(axis=Axis((0, -12.266666761, 6), (0, -1, 0)), mode=Mode.SUBTRACT)

    # F8_s3 → F8_t4 (revolve, cut)
    with BuildSketch(Plane.XY.offset(6)):
        Polygon((2.5, 12.266666761), (1.5, 11.266666761), (1.5, 12.266666761), align=None)
    revolve(axis=Axis((0, 12.266666761, 6), (0, -1, 0)), mode=Mode.SUBTRACT)


solid = f1.part
